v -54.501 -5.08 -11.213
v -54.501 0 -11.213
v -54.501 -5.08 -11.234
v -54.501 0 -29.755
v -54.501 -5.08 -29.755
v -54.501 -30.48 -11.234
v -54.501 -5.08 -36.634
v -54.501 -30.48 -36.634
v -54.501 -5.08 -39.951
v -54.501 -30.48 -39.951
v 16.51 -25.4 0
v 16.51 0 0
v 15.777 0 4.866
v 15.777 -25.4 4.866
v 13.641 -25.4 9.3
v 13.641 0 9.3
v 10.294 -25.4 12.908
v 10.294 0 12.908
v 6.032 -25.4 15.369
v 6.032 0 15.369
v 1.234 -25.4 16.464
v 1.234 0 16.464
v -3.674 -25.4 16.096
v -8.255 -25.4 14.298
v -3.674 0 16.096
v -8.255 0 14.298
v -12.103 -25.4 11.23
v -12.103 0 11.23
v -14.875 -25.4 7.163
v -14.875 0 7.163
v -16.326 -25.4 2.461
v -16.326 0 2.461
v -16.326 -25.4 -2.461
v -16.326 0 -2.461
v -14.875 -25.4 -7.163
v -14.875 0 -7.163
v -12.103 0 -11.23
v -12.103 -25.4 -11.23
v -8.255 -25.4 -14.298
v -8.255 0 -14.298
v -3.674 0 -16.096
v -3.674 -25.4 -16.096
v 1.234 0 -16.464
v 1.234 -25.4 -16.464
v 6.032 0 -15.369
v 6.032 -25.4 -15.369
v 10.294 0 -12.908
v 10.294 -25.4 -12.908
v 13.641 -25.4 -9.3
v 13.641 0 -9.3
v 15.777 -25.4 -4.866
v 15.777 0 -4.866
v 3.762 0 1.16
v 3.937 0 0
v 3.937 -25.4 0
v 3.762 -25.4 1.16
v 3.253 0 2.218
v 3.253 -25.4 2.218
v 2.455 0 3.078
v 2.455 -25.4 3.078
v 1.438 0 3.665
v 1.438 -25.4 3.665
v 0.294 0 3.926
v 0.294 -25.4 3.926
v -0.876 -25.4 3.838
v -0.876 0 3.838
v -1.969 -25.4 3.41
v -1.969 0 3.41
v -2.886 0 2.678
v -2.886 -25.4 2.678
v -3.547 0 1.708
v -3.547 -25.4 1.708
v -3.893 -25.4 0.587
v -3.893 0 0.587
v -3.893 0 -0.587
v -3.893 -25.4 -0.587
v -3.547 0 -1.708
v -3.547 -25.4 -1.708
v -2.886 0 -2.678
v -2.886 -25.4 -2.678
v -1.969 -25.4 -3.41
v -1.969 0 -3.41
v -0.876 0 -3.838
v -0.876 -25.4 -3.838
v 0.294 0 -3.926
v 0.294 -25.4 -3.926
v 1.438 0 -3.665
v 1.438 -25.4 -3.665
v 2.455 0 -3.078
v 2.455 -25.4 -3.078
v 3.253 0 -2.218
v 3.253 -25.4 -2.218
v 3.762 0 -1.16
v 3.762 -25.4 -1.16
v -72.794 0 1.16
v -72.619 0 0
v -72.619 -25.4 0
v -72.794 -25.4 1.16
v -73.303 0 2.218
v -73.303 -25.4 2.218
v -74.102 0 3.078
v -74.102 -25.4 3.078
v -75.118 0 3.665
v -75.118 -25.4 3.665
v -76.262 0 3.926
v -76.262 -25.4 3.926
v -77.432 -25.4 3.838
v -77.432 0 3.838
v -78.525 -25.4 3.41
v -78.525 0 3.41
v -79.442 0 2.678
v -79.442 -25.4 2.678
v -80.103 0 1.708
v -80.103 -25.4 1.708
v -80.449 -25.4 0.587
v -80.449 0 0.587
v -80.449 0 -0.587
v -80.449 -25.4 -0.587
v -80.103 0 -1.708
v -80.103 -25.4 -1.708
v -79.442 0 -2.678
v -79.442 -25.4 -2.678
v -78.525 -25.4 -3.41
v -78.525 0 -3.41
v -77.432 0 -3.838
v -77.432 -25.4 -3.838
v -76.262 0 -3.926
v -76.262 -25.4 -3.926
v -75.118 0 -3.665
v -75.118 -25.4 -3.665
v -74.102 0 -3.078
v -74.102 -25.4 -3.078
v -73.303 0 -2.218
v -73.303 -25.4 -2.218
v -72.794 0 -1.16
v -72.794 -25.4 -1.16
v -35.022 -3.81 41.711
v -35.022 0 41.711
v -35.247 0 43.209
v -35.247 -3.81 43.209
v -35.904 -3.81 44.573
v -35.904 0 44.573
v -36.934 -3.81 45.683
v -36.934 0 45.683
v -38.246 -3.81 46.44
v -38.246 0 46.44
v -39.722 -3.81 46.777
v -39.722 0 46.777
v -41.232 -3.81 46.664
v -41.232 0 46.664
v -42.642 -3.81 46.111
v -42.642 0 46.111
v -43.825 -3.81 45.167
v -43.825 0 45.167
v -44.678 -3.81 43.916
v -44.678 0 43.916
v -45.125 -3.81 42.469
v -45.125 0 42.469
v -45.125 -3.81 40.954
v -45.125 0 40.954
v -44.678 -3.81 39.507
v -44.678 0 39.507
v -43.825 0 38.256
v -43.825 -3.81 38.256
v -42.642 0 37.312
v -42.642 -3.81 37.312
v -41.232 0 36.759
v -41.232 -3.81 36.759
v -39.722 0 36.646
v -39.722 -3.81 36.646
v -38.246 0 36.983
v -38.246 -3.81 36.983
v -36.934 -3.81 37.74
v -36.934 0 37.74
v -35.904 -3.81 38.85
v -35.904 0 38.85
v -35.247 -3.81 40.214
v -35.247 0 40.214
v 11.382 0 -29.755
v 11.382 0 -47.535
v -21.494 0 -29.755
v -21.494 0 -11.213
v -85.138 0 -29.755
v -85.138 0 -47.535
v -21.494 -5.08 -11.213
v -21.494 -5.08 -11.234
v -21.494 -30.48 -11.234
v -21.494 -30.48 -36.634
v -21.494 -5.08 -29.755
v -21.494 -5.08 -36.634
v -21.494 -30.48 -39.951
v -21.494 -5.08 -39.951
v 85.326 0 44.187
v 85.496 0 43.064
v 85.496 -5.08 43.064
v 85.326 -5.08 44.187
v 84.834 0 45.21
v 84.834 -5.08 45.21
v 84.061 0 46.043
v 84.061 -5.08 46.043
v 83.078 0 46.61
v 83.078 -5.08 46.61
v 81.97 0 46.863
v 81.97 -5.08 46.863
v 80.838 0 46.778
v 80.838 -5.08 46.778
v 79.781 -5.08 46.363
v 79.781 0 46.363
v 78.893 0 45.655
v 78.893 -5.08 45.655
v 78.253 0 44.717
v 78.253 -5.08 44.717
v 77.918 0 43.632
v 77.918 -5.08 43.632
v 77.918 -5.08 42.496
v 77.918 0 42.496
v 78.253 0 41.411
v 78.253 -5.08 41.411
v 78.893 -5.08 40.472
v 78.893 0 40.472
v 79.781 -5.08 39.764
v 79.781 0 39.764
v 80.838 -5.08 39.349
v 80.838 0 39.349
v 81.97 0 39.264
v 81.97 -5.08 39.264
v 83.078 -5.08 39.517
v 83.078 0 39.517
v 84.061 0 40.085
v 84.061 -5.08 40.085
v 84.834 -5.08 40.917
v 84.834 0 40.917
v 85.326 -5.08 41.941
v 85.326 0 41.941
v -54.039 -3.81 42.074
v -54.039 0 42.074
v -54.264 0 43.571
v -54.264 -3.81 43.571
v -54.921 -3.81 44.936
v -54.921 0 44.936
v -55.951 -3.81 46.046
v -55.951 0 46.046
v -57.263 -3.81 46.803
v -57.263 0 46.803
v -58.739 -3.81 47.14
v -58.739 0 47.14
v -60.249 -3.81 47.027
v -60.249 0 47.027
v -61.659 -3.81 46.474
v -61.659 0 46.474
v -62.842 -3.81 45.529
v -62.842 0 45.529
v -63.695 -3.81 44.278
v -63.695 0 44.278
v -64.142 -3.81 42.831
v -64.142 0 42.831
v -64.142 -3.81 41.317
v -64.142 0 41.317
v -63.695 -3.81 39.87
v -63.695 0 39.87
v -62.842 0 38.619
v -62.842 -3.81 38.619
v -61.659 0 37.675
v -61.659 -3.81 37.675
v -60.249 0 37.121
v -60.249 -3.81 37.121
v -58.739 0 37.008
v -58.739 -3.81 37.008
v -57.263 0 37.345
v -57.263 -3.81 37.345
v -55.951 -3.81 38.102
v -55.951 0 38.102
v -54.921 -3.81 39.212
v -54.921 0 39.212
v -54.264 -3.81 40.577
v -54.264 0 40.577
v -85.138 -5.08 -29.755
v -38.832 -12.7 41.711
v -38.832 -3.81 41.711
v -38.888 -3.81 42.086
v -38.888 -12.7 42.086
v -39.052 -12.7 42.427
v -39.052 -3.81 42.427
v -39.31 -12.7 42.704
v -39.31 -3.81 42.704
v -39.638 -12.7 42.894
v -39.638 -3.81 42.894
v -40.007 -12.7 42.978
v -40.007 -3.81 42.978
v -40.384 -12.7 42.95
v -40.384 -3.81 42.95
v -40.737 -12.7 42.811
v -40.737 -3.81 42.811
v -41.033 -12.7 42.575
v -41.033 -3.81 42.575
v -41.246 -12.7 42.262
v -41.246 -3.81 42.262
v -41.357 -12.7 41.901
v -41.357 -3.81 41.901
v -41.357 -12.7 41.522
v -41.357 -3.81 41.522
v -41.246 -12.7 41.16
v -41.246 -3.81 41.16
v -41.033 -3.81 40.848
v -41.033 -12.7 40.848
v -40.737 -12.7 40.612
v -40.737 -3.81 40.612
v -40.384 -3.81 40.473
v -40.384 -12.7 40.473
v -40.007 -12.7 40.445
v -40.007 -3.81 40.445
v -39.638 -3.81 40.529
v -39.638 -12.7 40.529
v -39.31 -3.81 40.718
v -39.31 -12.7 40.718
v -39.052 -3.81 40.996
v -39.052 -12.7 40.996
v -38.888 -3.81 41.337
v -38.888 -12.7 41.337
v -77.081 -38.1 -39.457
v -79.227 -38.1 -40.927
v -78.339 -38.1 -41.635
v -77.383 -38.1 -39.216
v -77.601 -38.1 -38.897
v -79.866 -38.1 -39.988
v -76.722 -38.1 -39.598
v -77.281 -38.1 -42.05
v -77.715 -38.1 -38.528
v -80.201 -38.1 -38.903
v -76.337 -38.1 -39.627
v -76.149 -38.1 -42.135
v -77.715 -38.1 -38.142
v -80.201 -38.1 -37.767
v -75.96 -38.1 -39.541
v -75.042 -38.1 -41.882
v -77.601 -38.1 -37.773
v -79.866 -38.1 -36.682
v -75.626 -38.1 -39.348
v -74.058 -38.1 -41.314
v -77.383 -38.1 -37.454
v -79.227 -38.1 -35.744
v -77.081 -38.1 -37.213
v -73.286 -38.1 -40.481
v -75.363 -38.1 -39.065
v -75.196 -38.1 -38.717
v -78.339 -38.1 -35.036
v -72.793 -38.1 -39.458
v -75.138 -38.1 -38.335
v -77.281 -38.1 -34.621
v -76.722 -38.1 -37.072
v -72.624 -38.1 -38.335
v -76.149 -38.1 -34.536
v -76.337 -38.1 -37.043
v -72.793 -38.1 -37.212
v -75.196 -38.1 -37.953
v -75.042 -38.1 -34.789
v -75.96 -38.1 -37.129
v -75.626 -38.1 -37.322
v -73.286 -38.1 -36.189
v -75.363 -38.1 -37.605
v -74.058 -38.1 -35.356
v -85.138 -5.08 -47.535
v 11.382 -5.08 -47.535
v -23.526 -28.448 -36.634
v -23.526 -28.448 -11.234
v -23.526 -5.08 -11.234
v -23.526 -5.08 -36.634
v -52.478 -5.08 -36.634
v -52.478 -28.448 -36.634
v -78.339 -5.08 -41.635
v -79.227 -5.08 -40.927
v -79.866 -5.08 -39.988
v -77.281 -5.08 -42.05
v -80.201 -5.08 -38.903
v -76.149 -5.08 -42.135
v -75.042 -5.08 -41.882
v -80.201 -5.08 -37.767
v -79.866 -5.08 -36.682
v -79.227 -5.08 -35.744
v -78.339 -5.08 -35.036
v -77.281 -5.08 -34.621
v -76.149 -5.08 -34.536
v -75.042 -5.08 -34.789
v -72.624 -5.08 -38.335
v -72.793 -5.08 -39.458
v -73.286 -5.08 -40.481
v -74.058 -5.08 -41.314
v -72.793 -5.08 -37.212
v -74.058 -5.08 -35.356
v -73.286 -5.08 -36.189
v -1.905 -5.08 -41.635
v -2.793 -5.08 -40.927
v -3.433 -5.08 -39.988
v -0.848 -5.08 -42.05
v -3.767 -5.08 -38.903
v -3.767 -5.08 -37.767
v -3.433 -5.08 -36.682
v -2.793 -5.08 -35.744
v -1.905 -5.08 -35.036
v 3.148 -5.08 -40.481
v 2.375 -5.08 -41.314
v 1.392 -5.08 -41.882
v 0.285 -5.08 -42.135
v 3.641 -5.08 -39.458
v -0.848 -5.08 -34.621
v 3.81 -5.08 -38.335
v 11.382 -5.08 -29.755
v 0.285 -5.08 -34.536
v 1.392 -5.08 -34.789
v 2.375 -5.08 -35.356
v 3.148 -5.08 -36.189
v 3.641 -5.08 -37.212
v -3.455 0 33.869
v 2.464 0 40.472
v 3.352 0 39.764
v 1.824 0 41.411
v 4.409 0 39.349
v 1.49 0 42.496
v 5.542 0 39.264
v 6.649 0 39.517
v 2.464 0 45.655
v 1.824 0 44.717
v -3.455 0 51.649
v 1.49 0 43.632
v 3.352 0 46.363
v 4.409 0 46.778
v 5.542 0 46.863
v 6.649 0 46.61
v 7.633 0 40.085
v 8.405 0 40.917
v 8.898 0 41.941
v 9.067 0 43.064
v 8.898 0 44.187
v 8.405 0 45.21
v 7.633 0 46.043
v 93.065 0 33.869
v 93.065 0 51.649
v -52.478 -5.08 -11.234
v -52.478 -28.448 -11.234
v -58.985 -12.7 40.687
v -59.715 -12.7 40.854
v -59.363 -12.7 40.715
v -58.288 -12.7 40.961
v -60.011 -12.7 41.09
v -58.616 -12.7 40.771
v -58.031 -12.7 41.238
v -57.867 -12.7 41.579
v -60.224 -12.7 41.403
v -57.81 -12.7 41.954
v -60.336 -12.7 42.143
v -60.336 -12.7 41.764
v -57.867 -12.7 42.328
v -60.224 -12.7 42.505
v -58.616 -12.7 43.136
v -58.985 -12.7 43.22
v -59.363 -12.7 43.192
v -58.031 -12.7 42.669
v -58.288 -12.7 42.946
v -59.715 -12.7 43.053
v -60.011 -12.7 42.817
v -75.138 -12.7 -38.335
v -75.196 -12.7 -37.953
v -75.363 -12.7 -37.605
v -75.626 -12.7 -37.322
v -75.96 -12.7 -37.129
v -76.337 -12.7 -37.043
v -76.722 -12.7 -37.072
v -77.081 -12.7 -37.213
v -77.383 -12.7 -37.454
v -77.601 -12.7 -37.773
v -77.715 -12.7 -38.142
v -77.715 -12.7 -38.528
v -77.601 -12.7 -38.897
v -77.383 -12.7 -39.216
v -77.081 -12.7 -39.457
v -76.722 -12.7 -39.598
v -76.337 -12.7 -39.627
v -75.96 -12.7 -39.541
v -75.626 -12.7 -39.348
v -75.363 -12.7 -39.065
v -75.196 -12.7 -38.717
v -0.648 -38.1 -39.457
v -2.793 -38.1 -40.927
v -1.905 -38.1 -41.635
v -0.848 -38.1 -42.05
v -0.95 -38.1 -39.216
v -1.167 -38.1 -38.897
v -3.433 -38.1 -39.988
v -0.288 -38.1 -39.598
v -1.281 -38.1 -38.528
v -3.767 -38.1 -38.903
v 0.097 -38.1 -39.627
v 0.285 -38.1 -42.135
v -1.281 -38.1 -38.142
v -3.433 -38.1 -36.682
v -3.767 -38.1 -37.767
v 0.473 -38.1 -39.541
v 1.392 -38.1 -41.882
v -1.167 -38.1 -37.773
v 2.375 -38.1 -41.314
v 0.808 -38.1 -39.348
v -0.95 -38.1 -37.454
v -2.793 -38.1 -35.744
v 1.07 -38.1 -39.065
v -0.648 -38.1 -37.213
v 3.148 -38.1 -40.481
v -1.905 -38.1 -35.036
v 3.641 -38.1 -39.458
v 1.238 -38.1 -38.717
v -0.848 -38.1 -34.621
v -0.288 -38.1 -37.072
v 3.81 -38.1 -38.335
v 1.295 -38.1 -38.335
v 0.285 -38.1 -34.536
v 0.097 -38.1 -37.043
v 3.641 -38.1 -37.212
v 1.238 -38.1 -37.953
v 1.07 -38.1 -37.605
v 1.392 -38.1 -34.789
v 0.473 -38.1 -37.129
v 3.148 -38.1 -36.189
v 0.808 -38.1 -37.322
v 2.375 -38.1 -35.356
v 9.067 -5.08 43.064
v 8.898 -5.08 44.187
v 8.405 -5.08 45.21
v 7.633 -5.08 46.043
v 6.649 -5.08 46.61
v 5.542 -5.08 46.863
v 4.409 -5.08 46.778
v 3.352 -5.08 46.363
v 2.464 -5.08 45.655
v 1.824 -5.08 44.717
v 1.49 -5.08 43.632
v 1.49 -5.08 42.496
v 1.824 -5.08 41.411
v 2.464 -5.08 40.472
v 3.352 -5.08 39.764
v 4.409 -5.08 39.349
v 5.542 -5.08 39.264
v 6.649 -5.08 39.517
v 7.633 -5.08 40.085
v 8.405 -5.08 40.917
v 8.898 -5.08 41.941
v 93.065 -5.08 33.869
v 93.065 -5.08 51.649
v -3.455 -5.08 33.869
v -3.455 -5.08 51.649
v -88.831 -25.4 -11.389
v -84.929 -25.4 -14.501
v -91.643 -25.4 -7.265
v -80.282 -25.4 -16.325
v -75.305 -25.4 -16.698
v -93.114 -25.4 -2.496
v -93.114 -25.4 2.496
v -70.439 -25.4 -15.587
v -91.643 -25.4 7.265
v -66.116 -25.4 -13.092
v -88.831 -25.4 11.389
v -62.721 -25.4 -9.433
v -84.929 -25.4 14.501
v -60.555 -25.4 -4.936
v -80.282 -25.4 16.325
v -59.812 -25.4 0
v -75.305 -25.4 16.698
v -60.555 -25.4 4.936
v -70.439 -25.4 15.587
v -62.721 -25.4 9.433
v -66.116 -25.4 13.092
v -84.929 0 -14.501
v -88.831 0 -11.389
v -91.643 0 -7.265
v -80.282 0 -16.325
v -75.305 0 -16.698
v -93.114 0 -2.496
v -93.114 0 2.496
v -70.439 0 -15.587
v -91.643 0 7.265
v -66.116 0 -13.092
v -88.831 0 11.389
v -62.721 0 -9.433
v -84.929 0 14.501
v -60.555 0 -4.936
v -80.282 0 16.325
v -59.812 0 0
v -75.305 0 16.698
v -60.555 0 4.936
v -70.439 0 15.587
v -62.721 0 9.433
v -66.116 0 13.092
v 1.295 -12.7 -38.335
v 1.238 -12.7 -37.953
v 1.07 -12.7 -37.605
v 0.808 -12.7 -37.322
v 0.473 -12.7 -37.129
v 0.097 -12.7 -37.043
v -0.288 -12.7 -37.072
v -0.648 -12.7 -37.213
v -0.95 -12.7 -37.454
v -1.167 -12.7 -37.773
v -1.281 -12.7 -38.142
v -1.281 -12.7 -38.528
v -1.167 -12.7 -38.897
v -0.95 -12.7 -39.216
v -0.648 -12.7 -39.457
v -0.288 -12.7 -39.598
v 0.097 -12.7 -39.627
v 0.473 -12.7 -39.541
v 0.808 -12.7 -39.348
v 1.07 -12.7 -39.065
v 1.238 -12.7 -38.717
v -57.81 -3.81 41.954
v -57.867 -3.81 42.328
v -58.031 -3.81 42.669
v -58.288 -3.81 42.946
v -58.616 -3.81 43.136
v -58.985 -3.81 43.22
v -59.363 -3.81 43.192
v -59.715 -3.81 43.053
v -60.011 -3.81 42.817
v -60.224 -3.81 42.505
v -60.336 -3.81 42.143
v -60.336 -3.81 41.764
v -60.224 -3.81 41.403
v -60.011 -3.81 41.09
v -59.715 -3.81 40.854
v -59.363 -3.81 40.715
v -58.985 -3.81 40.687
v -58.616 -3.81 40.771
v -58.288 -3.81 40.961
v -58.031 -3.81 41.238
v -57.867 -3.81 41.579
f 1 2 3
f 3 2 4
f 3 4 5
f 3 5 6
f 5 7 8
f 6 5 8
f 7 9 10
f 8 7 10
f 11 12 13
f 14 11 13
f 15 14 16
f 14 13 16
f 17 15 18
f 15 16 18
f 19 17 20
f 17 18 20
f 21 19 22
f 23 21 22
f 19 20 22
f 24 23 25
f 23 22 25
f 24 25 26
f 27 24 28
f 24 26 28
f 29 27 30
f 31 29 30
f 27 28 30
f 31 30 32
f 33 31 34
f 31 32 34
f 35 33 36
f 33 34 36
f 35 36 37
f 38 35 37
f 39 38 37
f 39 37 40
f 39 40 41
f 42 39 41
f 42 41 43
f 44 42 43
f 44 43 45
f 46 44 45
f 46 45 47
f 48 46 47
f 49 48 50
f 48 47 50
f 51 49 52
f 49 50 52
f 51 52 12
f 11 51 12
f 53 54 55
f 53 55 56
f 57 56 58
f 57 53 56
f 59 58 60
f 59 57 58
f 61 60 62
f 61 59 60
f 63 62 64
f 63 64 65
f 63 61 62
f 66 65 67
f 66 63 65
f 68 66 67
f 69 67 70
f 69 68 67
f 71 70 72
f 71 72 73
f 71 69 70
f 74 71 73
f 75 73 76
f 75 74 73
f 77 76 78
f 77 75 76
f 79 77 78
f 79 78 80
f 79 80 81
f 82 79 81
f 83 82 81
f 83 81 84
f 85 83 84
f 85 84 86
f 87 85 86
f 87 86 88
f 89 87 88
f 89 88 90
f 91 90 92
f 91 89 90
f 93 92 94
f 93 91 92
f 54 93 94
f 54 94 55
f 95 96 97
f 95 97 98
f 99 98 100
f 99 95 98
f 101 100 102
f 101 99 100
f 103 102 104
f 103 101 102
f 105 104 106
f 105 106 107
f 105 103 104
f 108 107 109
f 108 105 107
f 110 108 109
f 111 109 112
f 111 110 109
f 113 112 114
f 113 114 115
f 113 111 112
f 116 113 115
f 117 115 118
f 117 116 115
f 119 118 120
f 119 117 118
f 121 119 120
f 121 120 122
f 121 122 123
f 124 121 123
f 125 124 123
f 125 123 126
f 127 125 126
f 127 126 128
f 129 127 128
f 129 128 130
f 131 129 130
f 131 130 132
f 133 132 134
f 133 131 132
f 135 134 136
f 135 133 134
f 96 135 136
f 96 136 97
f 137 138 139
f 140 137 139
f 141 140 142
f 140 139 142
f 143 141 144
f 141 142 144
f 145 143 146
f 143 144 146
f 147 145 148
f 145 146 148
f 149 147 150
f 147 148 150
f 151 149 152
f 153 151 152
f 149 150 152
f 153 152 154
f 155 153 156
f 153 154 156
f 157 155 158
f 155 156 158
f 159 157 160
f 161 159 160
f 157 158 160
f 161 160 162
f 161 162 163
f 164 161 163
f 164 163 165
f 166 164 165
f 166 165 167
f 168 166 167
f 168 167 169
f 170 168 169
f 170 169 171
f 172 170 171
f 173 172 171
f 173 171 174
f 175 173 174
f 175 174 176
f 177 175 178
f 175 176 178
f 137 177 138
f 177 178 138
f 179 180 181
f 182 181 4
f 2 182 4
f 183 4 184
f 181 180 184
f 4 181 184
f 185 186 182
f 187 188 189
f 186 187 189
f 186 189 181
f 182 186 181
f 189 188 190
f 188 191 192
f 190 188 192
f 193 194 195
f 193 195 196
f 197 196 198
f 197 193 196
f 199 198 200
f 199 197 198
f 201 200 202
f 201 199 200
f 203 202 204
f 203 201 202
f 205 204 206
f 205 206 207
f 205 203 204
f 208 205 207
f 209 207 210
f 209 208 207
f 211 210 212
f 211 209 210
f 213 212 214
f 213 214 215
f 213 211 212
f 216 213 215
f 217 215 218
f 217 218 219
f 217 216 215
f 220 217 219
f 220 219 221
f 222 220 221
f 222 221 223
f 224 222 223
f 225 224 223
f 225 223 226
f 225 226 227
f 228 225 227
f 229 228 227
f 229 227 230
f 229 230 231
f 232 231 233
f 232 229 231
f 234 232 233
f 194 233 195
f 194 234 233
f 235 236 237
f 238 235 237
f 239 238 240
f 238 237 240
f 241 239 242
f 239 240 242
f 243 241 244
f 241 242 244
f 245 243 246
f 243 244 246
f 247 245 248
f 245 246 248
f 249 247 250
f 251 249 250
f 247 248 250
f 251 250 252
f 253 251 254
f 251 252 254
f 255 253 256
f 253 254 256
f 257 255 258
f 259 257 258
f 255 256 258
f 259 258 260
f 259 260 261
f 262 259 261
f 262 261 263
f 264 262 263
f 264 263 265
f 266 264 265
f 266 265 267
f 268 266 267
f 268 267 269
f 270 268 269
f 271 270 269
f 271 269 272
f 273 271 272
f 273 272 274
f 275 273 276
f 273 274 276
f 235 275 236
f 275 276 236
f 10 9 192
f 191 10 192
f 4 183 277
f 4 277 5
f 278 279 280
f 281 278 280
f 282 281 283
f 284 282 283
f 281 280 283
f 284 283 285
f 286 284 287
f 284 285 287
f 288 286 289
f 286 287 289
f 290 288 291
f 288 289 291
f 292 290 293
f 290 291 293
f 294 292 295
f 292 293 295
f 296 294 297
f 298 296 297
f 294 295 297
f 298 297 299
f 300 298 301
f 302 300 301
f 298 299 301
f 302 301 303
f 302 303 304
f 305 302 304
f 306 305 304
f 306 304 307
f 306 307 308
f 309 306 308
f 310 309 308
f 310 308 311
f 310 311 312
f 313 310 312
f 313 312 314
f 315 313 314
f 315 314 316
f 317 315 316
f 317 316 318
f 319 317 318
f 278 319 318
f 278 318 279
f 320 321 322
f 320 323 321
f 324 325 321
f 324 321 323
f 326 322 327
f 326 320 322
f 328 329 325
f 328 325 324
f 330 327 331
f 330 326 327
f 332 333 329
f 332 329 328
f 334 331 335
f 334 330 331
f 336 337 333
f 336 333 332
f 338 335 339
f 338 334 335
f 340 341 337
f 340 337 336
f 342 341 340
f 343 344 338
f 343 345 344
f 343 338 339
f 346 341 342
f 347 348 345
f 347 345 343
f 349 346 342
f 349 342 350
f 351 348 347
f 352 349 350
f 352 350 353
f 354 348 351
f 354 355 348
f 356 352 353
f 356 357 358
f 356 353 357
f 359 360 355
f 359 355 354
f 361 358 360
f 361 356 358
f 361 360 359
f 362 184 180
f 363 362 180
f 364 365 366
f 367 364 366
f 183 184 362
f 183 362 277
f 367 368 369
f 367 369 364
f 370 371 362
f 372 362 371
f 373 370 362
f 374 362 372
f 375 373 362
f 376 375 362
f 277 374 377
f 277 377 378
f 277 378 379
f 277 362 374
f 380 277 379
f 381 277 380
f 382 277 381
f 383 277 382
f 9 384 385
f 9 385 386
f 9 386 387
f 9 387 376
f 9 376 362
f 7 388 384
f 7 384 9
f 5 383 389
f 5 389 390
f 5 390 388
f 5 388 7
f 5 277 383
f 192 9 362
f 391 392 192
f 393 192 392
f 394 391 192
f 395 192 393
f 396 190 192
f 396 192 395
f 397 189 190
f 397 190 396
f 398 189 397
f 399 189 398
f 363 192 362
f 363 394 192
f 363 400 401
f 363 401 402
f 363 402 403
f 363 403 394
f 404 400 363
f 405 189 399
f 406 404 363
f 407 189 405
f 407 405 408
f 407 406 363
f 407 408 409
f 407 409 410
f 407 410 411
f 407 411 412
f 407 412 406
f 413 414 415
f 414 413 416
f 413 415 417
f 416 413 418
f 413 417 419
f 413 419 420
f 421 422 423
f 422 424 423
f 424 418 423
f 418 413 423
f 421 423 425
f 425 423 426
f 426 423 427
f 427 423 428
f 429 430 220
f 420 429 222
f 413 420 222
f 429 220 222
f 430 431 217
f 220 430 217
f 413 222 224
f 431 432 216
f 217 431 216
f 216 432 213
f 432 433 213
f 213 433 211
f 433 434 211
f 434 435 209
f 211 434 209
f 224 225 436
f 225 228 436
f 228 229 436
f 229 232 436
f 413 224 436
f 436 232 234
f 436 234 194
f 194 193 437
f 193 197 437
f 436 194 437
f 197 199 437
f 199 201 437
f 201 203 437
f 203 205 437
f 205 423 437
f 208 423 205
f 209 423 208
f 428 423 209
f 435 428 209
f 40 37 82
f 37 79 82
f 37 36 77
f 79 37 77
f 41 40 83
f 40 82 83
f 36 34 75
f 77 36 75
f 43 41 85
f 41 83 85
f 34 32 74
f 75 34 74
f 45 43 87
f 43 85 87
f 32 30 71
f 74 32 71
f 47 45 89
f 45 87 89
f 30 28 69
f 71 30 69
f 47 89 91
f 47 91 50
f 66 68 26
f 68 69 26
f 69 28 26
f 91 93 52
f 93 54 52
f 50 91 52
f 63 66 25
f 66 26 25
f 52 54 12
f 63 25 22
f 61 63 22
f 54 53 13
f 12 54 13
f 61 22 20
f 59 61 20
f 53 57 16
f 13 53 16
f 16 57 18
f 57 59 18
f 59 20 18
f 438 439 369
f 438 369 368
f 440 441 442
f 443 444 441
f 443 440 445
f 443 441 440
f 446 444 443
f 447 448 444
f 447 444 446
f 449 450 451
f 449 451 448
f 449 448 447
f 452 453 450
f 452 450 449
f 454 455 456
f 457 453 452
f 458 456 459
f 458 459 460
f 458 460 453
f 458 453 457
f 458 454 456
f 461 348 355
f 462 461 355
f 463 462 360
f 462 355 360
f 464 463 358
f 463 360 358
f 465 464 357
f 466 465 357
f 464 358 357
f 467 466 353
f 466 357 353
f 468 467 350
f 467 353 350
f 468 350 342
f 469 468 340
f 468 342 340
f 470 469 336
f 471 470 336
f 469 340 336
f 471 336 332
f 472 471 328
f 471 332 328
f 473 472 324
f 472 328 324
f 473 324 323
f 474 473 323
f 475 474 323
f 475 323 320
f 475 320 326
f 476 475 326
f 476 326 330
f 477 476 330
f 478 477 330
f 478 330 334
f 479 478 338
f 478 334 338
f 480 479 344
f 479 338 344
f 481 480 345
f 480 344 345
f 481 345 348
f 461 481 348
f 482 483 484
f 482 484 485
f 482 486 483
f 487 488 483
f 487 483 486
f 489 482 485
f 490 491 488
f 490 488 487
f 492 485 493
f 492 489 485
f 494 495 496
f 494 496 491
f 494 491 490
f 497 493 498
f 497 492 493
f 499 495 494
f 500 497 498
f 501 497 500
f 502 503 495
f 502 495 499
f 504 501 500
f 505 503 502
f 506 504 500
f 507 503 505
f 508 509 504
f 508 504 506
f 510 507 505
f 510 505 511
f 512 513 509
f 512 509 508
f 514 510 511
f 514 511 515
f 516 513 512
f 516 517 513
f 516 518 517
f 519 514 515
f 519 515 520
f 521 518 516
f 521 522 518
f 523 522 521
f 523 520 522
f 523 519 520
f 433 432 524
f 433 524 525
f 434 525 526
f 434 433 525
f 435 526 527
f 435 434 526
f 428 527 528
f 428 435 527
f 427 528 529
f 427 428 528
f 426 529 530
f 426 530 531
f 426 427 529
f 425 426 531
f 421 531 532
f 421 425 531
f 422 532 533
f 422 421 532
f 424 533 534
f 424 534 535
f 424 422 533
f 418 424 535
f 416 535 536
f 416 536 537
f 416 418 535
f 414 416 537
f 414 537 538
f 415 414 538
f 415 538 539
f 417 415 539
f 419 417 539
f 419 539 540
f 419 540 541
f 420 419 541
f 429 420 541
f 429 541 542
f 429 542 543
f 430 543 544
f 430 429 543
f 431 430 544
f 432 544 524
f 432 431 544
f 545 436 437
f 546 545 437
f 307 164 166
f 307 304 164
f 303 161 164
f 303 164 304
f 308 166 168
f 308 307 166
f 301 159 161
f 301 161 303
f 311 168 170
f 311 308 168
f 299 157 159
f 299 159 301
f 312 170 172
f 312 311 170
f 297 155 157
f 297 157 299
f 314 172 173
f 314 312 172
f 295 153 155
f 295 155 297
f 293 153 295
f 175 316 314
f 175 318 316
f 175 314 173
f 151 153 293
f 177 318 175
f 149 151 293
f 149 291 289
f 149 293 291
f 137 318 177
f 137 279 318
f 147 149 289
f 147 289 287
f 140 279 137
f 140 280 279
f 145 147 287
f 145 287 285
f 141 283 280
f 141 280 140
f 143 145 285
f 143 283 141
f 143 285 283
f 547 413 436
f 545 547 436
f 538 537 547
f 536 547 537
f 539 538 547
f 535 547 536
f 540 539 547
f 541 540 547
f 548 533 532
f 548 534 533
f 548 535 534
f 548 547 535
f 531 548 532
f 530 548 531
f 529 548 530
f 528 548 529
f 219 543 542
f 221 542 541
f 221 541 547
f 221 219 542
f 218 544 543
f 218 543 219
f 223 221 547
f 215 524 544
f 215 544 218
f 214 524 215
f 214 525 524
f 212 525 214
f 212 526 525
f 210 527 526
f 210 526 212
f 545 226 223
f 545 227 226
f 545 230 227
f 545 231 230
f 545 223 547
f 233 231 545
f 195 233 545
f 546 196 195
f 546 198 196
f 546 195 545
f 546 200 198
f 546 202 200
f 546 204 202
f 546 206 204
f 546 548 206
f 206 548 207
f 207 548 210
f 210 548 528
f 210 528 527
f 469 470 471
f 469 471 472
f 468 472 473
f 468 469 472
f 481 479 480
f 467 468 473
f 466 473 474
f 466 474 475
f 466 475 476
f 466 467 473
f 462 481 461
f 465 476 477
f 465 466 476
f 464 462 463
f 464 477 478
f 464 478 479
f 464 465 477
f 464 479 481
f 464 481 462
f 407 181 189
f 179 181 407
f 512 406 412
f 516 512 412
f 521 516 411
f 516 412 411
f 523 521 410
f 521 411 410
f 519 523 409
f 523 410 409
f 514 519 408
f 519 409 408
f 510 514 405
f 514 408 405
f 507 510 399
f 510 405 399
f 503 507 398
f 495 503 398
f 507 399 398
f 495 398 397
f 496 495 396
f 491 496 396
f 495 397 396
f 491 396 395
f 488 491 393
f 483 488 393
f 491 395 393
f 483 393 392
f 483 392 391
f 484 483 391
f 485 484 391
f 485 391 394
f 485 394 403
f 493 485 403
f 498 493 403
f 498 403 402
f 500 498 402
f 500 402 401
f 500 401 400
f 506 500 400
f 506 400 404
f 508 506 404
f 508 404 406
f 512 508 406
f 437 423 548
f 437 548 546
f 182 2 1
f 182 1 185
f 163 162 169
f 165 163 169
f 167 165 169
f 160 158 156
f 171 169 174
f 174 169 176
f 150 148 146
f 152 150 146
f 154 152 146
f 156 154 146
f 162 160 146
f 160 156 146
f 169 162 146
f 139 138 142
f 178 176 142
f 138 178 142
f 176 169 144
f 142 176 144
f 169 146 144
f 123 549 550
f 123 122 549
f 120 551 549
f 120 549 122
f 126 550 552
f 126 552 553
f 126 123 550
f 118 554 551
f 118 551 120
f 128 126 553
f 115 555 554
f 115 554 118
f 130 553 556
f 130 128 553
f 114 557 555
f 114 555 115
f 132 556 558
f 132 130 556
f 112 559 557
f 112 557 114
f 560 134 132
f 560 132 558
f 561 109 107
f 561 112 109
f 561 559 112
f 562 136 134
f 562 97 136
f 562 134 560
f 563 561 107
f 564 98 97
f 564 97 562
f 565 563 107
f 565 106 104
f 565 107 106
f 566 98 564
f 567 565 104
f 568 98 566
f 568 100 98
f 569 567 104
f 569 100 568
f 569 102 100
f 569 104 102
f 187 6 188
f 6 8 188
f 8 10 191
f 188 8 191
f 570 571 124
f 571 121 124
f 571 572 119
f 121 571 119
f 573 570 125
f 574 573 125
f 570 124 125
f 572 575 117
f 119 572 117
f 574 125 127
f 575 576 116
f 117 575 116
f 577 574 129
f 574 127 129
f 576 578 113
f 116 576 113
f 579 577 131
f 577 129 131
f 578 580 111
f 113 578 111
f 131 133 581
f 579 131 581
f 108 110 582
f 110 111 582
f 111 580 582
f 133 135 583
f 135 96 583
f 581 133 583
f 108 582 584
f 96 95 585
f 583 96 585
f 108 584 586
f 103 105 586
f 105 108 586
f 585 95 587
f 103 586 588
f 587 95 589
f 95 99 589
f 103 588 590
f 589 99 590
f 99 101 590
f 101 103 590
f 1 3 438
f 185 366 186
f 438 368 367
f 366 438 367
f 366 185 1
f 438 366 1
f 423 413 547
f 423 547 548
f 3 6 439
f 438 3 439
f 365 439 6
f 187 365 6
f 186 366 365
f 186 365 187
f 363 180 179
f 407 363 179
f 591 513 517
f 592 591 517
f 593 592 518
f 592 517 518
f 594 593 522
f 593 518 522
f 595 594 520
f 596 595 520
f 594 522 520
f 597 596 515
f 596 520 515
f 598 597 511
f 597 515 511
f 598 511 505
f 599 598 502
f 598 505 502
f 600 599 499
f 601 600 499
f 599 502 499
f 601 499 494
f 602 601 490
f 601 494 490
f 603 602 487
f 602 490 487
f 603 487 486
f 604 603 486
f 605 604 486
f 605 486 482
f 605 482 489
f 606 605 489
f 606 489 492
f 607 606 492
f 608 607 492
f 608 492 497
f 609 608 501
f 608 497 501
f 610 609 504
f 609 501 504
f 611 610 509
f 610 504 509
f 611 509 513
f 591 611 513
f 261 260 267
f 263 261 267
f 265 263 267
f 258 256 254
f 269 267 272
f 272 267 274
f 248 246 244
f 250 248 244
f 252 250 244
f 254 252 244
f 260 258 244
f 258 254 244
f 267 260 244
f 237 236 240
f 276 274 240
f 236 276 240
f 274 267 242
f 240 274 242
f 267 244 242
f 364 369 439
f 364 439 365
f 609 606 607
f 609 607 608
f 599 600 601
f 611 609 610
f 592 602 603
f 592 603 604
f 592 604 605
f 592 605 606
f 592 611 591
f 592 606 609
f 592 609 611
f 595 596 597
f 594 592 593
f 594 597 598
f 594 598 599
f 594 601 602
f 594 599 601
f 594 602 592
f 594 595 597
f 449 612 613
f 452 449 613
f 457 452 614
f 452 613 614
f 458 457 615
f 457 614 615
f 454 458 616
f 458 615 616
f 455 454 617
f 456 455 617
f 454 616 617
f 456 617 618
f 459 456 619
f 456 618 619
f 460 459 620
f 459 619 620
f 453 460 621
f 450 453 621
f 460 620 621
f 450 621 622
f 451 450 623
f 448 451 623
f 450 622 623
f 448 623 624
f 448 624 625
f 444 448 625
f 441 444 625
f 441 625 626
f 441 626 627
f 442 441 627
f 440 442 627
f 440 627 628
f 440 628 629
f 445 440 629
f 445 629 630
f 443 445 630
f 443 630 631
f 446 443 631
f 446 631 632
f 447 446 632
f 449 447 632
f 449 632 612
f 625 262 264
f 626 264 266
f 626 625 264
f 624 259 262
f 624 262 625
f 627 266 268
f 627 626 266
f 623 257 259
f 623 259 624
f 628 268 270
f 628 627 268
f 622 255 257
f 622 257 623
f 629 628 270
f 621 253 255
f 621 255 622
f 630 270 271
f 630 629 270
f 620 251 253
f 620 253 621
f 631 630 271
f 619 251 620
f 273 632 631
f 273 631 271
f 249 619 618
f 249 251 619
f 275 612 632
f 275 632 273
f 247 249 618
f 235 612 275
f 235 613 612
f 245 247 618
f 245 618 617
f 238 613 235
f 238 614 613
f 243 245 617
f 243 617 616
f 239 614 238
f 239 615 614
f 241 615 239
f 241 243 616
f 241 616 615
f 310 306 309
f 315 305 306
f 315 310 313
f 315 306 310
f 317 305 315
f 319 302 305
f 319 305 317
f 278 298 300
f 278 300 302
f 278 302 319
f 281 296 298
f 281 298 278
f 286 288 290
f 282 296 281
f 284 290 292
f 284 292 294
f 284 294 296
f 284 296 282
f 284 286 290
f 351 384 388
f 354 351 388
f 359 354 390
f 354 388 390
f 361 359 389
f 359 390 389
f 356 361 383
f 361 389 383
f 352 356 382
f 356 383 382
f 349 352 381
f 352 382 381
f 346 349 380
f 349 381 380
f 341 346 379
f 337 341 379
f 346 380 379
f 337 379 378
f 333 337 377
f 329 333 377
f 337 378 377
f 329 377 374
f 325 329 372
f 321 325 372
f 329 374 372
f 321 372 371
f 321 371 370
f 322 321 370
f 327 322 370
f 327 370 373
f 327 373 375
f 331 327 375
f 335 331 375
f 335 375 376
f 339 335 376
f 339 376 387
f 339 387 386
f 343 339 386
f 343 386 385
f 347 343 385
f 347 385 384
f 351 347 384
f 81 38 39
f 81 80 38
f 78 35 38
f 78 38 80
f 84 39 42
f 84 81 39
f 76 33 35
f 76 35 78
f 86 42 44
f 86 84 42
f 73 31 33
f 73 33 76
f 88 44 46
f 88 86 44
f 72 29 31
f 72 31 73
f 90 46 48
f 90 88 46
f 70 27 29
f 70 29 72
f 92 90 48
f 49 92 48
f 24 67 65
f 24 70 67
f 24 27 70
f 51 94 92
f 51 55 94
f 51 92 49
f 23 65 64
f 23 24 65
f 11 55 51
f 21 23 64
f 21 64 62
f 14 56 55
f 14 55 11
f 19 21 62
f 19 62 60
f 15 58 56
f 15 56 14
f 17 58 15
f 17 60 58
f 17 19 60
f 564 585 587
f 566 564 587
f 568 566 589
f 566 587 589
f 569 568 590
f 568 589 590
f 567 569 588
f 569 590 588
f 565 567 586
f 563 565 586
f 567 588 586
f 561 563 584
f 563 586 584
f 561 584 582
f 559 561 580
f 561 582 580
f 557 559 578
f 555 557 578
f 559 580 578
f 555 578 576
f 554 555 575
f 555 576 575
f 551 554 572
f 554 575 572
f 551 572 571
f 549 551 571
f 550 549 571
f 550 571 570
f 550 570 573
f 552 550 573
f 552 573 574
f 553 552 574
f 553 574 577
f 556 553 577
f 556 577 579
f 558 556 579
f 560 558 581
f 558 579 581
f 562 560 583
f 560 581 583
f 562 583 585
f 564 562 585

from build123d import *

# Parameters (mm, degrees)
F0_R      = 16.51
F0_R_2    = 3.937
F1_DEPTH  = 25.4
F2_R      = 16.7447564174
F2_R_2    = 3.937
F3_DEPTH  = 25.4
F5_W      = 96.52
F5_H      = 17.78
F6_DEPTH  = 5.08
F4_R      = 3.81
F7_DEPTH  = 38.1
F8_DEPTH  = 38.1
F9_W      = 96.52
F9_H      = 17.78
F9_R      = 3.81
F10_DEPTH = 5.08
F11_R     = 1.27
F12_DEPTH = 12.7
F13_R     = 5.08
F14_DEPTH = 3.81
F15_W     = 33.0071151257
F15_H     = 3.3168159425
F16_DEPTH = 25.4
F17_R     = 1.2954
F18_DEPTH = 25.4
F19_R     = 1.2954
F20_DEPTH = 25.4
F21_W     = 2.0226240158
F21_H     = 25.4
F22_DEPTH = 25.4
F23_W     = 2.032
F23_H     = 25.4
F24_DEPTH = 25.4
F25_W     = 28.9524911098
F25_H     = 2.032
F26_DEPTH = 25.4
F28_DEPTH = 18.542
F30_R     = 5.08
F30_R_2   = 1.27
F31_DEPTH = 3.81
F32_DEPTH = 12.7


with BuildPart() as f1:
    # F0 (on Front) → F1 (new body)
    with BuildSketch(Plane.XZ):
        Circle(F0_R)
        Circle(F0_R_2, mode=Mode.SUBTRACT)
    extrude(amount=F1_DEPTH)


with BuildPart() as f3:
    # F2 (on Front) → F3 (new body)
    with BuildSketch(Plane.XZ):
        with Locations((-76.5563324094, 0)):
            Circle(F2_R)
        with Locations((-76.5563324094, 0)):
            Circle(F2_R_2, mode=Mode.SUBTRACT)
    extrude(amount=F3_DEPTH)


with BuildPart() as f6:
    # F5 (on Front) → F6 (new body)
    with BuildSketch(Plane.XZ):
        with Locations((-36.8777387089, -38.6449761546)):
            Rectangle(F5_W, F5_H)
    extrude(amount=F6_DEPTH)

    # F4 (on Front) → F7 (join)
    with BuildSketch(Plane.XZ):
        with Locations((0, -38.3352190256)):
            Circle(F4_R)
    extrude(amount=F7_DEPTH)

    # F4 (on Front) → F8 (join)
    with BuildSketch(Plane.XZ):
        with Locations((-76.4335915446, -38.3352190256)):
            Circle(F4_R)
    extrude(amount=F8_DEPTH)

    # F15 (on face) → F16 (join)
    with BuildSketch(Plane.XZ.offset(5.08)):
        with Locations((-37.9974767566, -38.2924098521)):
            Rectangle(F15_W, F15_H)
    extrude(amount=F16_DEPTH)

    # F17 (on face) → F18 (cut)
    with BuildSketch(Plane.XZ.offset(38.1)):
        with Locations((-76.4335915446, -38.3352190256)):
            Circle(F17_R)
    extrude(amount=-F18_DEPTH, mode=Mode.SUBTRACT)

    # F19 (on face) → F20 (cut)
    with BuildSketch(Plane.XZ.offset(38.1)):
        with Locations((0, -38.3352190256)):
            Circle(F19_R)
    extrude(amount=-F20_DEPTH, mode=Mode.SUBTRACT)

    # F21 (on face) → F22 (join)
    with BuildSketch(Plane.XY.offset(-36.6340018809)):
        with Locations((-53.4897223115, -17.78)):
            Rectangle(F21_W, F21_H)
    extrude(amount=F22_DEPTH)

    # F23 (on face) → F24 (join)
    with BuildSketch(Plane.XY.offset(-36.6340018809)):
        with Locations((-22.5099191937, -17.78)):
            Rectangle(F23_W, F23_H)
    extrude(amount=F24_DEPTH)

    # F25 (on face) → F26 (join)
    with BuildSketch(Plane.XY.offset(-36.6340018809)):
        with Locations((-38.0021647487, -29.464)):
            Rectangle(F25_W, F25_H)
    extrude(amount=F26_DEPTH)

    # F27 (on face) → F28 (join)
    with BuildSketch(Plane.XY.offset(-29.7549761546)):
        Polygon((-23.5259191937, -5.08), (-21.4939191937, -5.08), (-21.4939191937, 0), (-54.5010343194, 0), (-54.5010343194, -5.08), (-52.4784103036, -5.08), align=None)
    extrude(amount=F28_DEPTH)


with BuildPart() as f10:
    # F9 (on Front) → F10 (new body)
    with BuildSketch(Plane.XZ):
        with Locations((44.8049414659, 42.7589275086)):
            Rectangle(F9_W, F9_H)
        with Locations((5.2571414659, 43.0637275086)):
            Circle(F9_R, mode=Mode.SUBTRACT)
        with Locations((81.6857414659, 43.0637275086)):
            Circle(F9_R, mode=Mode.SUBTRACT)
    extrude(amount=F10_DEPTH)


with BuildPart() as f12:
    # F11 (on Front) → F12 (new body)
    with BuildSketch(Plane.XZ):
        with Locations((-59.0801499784, 41.9535636902)):
            Circle(F11_R)
    extrude(amount=F12_DEPTH)

    # F13 (on Front) → F14 (join)
    with BuildSketch(Plane.XZ):
        with Locations((-59.1185614467, 42.0741327107)):
            Circle(F13_R)
    extrude(amount=F14_DEPTH)


with BuildPart() as f31:
    # F30 (on Front) → F31 (new body)
    with BuildSketch(Plane.XZ):
        with Locations((-40.1015244424, 41.7113900185)):
            Circle(F30_R)
        with Locations((-40.1015244424, 41.7113900185)):
            Circle(F30_R_2, mode=Mode.SUBTRACT)
    extrude(amount=F31_DEPTH)

    # F30 (on Front) → F32 (join)
    with BuildSketch(Plane.XZ):
        with Locations((-40.1015244424, 41.7113900185)):
            Circle(F30_R_2)
    extrude(amount=F32_DEPTH)


solid = Compound([f1.part, f3.part, f6.part, f10.part, f12.part, f31.part])
